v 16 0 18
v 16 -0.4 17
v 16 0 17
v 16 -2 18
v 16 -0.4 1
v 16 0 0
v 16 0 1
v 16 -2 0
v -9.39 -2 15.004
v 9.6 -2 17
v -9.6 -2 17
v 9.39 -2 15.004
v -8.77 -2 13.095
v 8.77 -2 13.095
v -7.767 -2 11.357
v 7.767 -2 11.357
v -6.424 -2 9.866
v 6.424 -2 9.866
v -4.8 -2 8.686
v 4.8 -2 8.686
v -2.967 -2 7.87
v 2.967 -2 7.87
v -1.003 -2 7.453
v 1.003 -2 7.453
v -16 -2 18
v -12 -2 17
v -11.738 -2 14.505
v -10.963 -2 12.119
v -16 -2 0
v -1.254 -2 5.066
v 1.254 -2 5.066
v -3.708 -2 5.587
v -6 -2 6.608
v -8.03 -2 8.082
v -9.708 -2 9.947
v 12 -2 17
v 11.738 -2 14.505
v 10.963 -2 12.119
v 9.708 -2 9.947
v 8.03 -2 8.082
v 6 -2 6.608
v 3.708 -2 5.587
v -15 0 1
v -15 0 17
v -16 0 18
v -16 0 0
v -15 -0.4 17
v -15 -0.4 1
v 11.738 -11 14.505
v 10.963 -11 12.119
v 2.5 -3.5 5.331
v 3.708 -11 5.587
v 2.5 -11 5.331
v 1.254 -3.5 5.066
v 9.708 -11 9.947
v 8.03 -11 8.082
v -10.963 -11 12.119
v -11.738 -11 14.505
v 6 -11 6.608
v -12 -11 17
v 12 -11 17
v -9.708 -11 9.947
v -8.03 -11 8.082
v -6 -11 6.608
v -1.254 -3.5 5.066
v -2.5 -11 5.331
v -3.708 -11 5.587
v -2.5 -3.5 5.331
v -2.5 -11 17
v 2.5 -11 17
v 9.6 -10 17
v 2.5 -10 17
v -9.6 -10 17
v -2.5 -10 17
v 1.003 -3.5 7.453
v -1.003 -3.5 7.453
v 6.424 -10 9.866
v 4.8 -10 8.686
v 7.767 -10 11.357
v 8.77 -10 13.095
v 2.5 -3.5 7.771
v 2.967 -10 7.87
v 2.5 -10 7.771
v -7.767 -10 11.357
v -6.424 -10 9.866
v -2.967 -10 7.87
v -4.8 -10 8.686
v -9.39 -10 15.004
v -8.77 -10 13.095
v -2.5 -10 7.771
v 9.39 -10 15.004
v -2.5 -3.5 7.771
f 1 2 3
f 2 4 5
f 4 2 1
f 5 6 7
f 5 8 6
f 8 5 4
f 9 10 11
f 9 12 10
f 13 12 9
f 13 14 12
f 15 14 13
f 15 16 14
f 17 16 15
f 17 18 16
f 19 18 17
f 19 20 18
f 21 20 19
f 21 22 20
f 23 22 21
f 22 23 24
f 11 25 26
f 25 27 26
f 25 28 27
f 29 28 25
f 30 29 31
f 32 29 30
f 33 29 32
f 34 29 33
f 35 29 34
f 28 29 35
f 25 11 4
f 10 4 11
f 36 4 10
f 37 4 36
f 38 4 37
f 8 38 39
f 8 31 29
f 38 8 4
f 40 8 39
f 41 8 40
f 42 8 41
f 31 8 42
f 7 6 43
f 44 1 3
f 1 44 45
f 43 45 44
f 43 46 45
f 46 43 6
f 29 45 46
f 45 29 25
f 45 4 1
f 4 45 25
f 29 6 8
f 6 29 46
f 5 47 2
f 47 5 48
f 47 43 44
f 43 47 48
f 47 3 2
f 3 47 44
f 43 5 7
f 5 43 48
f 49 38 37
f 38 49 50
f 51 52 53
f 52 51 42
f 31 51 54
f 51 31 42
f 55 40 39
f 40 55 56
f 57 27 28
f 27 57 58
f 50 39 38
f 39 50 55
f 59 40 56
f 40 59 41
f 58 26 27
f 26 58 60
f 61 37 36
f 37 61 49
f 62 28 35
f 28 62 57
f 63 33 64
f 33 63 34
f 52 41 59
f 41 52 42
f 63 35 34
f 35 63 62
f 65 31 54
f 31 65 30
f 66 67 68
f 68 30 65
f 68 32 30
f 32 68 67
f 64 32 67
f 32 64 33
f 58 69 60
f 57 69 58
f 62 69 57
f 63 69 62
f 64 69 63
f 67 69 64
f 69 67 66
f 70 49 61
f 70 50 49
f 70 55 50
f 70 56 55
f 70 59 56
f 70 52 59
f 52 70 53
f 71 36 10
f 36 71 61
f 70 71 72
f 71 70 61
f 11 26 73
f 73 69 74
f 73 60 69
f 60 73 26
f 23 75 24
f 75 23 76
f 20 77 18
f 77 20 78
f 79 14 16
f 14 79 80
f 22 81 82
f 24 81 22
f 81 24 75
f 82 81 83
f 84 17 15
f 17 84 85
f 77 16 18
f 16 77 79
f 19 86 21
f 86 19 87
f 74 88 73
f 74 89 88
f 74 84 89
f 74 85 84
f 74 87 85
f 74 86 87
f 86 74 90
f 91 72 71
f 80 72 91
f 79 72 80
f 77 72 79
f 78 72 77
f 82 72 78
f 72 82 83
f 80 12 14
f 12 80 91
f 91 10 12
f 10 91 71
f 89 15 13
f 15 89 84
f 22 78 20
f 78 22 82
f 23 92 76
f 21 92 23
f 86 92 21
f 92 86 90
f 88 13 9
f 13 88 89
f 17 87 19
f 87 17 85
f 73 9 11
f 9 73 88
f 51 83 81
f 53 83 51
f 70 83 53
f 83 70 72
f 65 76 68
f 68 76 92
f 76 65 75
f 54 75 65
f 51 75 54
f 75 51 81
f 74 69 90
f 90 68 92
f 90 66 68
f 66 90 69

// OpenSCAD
//
// A holder for USB cables when used to charge devices
//

in_width = 16.0;
in_length = 30.0;
in_depth = 0.5;

base_height = in_depth + 1.5;

module holder_base () {
    // The base is open on one short side (with a 1.6 mm extension)
    // in order to admit the tongue of a Command glue strip.
    difference () {
        translate([0, 0, base_height/2])
            cube([in_length+2.0, in_width+2.0, base_height], center=true);
        translate ([1.6/2, 0, in_depth/2 - 0.1])
            cube([in_length + 1.6, in_width, in_depth], center=true);
    }
}

module holder_fixture () {
    difference () {
        translate([0, in_width/2, base_height]) {
            difference () {
                fixture_r = 12.0;
                fixture_th = 10.0;
                // The main body half-cylinder
                intersection () {
                    cylinder(fixture_th, fixture_r, fixture_r);
                    translate([0, (fixture_r/2)*-1, 8.0/2]) {
                        cube([fixture_r*2, fixture_r, fixture_th], center=true);
                    }
                }
                // Cutout for the Mini-B or Micro-B connector
                cylinder(8.0, fixture_r*0.8, fixture_r*0.8);
                // Cutout for the USB cable
                translate([0, (fixture_r/2)*-1, fixture_th/2 + 1.5])
                    cube([5.0, fixture_r + 0.1, fixture_th], center=true);
            }
        }
    }
}

module holder () {
    // It's better to print on the side, so flip it.
    translate ([0, 0, (in_width+2.0)/2]) rotate(90, [1,0,0]) {
        union () {
            holder_base();
            holder_fixture();
        }
    }
}

holder();
